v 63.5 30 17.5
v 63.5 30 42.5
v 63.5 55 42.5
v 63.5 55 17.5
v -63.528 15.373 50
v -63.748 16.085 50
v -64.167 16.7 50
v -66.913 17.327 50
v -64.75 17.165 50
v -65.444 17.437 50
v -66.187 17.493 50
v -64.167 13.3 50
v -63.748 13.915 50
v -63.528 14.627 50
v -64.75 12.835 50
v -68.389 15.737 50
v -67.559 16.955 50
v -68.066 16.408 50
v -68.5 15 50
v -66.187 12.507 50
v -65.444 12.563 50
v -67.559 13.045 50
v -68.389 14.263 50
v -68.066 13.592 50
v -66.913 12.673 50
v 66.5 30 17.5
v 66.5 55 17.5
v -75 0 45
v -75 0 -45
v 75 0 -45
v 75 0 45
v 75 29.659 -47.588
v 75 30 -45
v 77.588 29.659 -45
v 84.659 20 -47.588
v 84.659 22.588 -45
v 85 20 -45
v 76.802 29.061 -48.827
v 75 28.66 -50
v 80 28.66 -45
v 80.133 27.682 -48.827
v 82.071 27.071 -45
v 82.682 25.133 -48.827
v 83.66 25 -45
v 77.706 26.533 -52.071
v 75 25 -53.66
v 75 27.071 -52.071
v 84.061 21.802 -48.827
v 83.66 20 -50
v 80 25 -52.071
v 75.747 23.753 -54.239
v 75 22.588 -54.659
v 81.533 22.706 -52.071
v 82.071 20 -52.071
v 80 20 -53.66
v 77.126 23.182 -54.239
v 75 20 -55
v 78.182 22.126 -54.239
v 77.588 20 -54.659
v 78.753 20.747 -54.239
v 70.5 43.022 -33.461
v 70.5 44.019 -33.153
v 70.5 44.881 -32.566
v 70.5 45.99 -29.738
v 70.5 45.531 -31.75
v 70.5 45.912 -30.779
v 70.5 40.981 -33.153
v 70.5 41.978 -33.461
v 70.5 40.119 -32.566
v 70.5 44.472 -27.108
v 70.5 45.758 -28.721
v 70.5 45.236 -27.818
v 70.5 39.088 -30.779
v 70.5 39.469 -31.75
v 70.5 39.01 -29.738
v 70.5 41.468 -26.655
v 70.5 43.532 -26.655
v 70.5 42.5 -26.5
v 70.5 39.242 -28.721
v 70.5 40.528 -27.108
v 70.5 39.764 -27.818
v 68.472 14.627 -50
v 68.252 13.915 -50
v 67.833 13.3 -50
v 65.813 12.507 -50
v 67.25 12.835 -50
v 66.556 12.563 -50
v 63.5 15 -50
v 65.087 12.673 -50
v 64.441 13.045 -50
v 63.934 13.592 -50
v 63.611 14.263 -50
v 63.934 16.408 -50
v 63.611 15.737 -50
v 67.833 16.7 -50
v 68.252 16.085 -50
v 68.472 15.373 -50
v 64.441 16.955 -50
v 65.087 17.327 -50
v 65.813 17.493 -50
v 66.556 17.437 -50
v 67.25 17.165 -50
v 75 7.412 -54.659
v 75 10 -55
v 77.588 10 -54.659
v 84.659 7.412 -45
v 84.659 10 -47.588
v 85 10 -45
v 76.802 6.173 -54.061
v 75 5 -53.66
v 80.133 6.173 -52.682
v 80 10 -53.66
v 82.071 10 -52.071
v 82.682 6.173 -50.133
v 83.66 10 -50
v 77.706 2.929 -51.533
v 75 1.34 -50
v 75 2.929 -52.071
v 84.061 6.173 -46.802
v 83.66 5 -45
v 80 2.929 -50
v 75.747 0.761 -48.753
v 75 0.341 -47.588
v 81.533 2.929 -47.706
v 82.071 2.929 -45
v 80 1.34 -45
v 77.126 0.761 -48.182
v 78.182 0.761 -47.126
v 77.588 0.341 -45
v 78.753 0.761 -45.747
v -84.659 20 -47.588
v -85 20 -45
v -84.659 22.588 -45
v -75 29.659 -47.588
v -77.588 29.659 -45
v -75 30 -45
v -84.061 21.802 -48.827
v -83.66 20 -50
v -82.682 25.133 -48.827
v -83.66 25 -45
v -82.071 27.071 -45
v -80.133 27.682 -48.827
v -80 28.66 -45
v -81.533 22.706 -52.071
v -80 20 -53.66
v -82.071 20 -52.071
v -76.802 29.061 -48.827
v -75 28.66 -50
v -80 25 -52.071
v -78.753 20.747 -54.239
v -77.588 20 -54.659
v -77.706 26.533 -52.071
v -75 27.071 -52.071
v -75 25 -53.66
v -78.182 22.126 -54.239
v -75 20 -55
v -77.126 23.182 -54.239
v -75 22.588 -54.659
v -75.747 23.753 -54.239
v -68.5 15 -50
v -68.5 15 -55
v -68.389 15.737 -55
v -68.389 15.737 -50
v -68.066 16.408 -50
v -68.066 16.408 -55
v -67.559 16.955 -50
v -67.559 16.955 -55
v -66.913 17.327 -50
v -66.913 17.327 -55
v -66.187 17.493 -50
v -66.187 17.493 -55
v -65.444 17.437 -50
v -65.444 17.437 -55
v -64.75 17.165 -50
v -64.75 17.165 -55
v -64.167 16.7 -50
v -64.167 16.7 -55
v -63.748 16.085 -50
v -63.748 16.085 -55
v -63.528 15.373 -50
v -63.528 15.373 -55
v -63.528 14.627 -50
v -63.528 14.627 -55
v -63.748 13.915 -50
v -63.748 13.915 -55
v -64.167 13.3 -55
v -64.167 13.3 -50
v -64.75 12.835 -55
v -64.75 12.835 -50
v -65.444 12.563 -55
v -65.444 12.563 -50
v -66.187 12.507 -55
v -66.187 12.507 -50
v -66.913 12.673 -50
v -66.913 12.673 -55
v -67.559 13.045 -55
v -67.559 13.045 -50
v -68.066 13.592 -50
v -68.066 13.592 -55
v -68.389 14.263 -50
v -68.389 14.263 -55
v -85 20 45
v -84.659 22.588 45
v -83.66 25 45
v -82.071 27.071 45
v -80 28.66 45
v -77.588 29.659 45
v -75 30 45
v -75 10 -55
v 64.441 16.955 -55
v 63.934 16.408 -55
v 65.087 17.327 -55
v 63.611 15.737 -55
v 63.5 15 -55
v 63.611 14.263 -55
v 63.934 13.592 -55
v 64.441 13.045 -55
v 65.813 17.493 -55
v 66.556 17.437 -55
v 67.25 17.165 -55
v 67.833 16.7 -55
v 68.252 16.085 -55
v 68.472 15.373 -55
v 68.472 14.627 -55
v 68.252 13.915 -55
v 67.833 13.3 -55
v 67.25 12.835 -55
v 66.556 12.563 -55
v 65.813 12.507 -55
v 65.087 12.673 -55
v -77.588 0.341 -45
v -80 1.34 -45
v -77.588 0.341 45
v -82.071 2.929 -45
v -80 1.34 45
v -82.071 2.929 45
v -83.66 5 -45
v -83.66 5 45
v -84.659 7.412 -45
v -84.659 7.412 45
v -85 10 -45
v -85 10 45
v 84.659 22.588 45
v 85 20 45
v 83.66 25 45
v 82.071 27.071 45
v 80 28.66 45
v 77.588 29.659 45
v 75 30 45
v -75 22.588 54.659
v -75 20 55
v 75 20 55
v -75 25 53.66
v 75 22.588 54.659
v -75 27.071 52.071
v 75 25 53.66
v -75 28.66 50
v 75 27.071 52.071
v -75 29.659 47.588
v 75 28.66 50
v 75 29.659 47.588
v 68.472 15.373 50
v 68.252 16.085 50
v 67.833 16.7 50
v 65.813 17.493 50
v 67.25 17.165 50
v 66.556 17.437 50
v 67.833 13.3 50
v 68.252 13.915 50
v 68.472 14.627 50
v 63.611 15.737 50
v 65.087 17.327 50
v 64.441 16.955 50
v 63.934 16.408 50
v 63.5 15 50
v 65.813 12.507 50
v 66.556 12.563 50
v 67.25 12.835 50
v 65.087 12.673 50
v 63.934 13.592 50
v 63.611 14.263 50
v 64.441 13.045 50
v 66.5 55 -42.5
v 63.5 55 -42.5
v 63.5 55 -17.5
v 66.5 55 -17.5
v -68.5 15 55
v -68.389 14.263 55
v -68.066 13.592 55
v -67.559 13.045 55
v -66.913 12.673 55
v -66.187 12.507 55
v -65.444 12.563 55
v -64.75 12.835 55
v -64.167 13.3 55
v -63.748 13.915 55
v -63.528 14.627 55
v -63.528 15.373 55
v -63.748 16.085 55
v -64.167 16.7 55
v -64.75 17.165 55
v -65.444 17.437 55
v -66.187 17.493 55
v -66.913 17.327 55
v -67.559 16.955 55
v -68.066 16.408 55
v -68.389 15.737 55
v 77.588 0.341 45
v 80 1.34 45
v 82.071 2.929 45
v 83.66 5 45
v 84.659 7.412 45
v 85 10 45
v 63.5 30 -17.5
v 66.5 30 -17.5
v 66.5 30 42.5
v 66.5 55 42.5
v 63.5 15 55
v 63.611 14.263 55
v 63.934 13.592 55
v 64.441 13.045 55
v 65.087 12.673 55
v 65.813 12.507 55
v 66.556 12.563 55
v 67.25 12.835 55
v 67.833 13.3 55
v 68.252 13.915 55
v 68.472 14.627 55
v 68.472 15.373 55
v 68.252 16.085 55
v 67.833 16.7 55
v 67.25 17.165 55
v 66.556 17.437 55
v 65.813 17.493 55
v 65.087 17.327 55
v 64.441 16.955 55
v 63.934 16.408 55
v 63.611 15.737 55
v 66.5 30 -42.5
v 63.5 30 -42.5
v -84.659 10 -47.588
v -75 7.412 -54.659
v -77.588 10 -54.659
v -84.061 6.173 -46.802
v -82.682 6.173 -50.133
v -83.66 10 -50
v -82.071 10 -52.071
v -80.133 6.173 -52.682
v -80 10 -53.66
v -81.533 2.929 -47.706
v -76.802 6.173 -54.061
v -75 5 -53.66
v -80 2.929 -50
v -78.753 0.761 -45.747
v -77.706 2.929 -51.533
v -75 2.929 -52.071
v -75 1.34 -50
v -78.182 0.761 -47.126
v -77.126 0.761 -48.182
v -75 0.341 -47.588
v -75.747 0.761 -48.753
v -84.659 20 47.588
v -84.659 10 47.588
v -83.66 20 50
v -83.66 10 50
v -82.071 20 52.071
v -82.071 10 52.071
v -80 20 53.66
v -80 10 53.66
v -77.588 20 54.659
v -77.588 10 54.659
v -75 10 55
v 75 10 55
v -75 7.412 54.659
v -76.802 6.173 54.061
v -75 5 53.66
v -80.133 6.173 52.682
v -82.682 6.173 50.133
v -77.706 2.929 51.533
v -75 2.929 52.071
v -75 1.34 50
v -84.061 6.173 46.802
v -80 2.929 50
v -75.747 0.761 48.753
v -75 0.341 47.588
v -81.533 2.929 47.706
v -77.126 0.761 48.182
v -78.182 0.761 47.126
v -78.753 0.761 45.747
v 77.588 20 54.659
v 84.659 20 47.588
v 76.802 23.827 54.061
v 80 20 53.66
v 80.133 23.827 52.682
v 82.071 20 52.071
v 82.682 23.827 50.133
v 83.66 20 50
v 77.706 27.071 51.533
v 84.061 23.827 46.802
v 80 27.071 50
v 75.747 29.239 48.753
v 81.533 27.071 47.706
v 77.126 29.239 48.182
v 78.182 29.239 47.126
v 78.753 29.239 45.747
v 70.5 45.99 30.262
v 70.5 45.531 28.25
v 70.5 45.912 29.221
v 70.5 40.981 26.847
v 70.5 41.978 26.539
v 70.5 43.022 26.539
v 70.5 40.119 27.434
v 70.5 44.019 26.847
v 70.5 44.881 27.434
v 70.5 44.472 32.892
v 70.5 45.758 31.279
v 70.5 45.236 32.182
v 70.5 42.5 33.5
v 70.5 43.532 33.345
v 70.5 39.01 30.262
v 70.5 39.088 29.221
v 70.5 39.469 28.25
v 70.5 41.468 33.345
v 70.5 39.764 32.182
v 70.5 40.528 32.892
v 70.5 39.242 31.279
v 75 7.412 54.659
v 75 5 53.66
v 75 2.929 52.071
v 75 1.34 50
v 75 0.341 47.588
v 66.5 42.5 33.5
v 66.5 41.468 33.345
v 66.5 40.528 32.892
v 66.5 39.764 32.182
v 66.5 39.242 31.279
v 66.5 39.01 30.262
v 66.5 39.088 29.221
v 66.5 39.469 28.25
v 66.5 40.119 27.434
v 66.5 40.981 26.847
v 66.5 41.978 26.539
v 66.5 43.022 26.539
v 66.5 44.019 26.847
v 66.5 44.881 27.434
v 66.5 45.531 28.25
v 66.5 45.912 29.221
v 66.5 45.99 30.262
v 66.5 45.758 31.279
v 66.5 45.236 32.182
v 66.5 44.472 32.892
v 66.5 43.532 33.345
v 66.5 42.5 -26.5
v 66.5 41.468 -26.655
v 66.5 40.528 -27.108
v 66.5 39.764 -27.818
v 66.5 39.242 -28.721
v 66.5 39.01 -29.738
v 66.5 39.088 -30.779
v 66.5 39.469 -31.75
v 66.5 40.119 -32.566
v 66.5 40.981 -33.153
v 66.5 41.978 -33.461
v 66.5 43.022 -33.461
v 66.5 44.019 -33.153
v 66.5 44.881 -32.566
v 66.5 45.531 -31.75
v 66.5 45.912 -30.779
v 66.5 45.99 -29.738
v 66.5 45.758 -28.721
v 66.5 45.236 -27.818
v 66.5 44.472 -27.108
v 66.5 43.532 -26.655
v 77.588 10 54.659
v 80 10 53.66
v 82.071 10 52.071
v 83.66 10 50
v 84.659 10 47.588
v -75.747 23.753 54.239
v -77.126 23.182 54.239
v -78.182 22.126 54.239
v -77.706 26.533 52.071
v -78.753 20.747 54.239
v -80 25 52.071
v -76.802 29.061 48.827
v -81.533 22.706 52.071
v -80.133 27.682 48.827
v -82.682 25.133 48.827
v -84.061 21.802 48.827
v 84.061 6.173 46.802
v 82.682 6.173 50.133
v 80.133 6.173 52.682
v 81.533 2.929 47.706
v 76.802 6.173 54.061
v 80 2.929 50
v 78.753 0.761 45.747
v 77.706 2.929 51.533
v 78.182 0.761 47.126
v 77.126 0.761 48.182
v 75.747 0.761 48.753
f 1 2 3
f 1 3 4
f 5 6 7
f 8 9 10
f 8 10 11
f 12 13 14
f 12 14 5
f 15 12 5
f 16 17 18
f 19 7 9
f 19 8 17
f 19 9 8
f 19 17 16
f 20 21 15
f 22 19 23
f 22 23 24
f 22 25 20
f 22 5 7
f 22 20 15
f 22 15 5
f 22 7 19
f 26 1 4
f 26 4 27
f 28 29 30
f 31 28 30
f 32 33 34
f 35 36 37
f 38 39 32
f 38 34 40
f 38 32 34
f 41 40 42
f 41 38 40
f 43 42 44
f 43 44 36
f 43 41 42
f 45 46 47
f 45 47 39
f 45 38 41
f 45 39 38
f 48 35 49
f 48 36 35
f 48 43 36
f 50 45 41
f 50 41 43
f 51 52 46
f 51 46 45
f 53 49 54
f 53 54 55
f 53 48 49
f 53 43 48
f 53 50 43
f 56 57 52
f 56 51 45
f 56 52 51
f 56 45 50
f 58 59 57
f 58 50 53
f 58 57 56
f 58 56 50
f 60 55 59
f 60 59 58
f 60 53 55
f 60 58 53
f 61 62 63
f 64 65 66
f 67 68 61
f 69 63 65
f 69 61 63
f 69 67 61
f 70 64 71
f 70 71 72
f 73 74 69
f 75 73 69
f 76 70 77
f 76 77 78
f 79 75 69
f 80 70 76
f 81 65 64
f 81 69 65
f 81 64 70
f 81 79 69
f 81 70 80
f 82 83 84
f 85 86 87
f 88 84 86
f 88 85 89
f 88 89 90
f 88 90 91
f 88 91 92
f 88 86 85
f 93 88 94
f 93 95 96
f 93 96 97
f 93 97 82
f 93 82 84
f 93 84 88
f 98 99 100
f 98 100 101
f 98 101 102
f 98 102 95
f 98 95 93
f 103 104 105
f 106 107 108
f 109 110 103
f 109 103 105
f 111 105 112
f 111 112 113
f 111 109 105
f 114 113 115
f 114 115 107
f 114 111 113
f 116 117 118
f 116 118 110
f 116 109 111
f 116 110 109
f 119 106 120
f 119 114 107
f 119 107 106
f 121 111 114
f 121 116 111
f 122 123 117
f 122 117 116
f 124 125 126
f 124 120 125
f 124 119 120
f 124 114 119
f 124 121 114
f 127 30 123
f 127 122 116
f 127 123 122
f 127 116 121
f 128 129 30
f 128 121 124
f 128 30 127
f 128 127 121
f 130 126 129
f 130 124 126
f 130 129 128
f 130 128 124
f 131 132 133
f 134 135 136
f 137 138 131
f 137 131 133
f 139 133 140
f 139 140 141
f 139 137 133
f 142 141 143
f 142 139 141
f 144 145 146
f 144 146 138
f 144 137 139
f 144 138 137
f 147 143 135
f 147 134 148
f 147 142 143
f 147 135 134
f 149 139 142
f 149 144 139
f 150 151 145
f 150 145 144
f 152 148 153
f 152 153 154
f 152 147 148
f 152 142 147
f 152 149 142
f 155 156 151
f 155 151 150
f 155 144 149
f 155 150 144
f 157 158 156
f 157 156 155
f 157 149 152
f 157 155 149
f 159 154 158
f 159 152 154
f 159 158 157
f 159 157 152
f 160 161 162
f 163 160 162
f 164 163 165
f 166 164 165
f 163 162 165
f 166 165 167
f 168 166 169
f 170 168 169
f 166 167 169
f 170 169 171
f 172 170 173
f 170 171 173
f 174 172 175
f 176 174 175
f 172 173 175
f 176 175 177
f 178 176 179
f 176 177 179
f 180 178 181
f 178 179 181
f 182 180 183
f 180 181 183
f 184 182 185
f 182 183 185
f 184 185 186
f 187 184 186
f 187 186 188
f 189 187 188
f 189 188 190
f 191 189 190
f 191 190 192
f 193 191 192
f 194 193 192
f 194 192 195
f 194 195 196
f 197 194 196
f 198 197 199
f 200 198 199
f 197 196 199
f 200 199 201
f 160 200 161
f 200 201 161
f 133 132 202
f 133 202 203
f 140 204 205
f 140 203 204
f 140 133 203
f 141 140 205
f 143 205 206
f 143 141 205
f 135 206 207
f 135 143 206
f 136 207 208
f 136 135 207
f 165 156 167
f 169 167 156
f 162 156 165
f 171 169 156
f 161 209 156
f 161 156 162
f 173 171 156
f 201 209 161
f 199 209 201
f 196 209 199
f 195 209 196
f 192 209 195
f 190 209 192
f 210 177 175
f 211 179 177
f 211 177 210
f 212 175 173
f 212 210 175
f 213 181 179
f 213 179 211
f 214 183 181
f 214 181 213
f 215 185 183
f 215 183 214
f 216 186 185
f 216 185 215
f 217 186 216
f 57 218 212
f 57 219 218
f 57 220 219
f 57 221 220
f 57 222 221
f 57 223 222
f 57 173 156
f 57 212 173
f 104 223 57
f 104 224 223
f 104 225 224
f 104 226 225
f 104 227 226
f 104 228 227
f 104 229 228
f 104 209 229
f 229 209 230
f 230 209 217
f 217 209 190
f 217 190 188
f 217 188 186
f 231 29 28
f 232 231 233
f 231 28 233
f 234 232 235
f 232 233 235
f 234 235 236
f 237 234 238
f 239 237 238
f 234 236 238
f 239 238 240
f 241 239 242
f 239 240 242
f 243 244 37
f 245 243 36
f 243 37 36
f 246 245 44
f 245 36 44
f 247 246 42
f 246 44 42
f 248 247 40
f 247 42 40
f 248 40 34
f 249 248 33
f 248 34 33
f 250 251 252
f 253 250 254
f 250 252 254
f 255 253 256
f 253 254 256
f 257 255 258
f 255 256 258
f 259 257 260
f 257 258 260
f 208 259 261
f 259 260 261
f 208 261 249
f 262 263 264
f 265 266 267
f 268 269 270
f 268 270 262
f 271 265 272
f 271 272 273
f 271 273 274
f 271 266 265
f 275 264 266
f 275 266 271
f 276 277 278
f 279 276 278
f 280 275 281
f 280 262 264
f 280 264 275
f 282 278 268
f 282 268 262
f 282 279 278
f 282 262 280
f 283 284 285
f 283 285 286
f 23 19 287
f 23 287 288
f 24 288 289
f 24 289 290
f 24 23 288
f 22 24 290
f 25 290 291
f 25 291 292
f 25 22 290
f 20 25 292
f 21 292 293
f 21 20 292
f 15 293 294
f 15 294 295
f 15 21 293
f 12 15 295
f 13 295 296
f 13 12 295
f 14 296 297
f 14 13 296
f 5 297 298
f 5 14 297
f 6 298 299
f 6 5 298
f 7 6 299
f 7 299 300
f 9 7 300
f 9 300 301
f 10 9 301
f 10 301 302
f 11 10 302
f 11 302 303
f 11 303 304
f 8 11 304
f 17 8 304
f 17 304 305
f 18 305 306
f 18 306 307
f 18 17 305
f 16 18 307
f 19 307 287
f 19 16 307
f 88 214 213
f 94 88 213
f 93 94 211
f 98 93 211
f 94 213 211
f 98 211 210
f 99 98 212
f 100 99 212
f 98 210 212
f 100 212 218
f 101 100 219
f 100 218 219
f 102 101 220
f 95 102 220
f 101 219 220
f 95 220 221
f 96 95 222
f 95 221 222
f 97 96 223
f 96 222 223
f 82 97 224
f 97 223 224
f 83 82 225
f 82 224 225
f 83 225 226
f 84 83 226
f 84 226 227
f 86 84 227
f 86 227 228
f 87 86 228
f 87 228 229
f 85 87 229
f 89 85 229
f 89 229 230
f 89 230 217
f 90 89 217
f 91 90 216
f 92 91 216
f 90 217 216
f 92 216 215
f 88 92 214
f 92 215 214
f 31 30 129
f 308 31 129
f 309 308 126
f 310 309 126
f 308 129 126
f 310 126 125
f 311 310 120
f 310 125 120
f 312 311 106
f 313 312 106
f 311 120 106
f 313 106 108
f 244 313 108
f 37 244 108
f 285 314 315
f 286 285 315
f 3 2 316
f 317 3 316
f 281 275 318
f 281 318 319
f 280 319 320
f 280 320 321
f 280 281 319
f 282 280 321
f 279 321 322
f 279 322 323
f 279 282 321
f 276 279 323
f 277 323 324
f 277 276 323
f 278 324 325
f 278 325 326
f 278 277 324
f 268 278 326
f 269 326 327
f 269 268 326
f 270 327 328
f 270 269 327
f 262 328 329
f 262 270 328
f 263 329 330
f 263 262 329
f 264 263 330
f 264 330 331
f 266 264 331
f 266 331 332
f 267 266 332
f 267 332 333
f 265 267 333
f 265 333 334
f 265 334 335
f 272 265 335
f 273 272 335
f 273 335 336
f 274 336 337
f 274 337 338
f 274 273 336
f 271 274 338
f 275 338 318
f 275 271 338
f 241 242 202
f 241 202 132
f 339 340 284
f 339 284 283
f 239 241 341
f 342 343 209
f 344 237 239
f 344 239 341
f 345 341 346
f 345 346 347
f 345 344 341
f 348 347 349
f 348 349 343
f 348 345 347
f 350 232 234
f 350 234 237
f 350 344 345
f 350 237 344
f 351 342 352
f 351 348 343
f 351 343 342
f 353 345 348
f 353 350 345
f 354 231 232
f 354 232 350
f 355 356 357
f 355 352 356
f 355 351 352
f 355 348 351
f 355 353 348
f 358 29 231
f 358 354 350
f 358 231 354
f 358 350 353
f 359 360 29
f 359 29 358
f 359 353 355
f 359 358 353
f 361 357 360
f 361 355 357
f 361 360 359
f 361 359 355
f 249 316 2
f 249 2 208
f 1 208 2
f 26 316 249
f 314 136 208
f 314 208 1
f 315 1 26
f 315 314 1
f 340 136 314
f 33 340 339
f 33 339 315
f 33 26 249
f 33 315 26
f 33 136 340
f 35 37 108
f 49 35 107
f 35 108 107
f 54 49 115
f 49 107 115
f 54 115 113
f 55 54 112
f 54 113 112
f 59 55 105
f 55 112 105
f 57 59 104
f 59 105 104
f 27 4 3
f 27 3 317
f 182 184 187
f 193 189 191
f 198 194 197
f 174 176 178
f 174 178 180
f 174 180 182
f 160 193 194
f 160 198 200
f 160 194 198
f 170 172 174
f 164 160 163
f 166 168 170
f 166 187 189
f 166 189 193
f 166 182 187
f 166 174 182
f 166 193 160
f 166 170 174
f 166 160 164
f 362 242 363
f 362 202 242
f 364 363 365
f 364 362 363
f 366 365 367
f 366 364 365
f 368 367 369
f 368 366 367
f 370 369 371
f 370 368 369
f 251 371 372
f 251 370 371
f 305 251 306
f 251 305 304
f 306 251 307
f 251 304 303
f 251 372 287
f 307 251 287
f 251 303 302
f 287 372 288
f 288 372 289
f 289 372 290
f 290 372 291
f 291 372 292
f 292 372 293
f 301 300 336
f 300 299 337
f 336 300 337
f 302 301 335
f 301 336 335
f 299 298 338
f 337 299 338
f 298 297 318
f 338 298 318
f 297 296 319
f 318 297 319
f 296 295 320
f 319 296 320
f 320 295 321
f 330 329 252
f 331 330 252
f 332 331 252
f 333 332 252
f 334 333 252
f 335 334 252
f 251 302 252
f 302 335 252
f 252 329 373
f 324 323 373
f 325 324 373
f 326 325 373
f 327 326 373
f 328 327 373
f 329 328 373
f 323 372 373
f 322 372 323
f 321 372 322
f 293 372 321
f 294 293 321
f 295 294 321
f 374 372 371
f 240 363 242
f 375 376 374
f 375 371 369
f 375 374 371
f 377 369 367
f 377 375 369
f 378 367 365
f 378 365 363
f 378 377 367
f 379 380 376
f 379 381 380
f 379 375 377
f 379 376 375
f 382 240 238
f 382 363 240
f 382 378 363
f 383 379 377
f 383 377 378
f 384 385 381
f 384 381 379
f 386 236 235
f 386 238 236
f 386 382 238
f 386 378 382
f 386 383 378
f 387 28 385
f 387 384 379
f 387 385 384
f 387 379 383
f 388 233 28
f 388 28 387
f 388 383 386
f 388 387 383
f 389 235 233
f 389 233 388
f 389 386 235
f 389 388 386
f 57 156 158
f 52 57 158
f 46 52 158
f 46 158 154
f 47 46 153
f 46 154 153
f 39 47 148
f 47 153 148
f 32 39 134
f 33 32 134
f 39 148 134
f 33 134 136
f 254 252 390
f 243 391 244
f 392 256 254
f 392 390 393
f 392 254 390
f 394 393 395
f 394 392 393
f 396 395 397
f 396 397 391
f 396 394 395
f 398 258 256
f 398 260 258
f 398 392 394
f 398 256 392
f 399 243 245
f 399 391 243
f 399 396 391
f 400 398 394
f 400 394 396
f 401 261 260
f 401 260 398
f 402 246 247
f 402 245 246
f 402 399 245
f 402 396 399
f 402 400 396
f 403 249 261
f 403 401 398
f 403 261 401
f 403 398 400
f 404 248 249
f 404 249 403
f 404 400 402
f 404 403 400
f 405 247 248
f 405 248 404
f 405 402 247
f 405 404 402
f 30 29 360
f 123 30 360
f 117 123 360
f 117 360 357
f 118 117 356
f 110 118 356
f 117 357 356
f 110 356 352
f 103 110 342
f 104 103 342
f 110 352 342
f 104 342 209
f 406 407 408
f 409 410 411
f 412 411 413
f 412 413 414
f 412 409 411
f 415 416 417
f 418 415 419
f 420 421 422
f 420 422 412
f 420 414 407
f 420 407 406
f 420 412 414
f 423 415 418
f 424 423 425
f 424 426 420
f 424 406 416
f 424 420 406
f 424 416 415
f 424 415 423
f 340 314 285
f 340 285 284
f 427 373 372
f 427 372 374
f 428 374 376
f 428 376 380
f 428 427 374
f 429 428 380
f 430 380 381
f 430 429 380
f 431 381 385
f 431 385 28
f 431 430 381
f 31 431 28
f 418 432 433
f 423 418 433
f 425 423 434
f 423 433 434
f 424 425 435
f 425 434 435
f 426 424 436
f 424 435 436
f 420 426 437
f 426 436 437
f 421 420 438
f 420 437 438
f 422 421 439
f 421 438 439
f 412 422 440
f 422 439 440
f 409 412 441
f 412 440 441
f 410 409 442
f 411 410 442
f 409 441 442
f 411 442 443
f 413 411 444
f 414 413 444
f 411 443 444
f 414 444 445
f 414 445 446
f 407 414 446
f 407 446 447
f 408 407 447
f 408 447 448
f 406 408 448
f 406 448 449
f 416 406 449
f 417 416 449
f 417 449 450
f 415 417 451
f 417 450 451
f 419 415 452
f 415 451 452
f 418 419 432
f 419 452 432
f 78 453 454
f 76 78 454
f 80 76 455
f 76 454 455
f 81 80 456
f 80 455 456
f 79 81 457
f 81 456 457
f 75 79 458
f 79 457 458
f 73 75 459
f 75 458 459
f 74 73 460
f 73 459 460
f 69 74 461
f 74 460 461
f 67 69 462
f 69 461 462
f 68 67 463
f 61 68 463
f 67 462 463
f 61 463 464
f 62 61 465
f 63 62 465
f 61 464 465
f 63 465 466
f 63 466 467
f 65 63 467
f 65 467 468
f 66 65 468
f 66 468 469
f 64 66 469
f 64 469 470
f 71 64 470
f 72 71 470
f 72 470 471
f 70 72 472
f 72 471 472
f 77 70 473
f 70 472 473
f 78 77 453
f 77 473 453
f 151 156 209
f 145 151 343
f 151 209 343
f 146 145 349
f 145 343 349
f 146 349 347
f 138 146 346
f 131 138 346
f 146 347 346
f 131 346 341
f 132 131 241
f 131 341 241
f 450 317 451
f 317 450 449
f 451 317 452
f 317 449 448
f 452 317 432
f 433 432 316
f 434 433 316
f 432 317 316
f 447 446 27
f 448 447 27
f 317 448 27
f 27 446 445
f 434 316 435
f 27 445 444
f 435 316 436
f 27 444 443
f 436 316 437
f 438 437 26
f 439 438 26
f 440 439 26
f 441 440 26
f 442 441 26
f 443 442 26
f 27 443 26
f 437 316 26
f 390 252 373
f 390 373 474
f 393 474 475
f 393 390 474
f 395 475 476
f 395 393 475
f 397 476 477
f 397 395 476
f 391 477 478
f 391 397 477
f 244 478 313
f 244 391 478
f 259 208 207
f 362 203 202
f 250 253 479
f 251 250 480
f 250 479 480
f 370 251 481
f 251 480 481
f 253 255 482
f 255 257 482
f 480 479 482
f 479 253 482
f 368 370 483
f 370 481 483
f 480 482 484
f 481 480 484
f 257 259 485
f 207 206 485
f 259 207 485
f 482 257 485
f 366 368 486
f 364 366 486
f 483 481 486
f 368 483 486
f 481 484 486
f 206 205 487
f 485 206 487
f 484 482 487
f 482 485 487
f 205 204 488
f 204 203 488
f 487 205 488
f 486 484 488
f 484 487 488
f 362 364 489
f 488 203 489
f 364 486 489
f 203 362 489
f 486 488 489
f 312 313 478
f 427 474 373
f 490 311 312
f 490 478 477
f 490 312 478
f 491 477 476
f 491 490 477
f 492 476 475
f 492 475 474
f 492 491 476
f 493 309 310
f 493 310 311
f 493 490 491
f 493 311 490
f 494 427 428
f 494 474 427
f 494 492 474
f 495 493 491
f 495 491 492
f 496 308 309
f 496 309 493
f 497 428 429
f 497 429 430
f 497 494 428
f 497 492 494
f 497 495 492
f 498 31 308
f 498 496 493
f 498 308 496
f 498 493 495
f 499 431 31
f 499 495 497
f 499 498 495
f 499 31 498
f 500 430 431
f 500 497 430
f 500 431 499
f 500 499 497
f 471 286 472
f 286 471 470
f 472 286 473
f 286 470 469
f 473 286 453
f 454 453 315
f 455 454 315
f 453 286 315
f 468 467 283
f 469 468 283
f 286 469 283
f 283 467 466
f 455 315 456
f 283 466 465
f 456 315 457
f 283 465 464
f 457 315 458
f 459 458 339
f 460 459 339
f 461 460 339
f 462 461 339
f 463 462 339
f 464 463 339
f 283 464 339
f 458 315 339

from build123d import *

# Parameters (mm, degrees)
SKETCH1_W           = 170
SKETCH1_H           = 110
BOSS_EXTRUDE1_DEPTH = 30
FILLET2_R           = 10
FILLET3_R           = 10
FILLET4_R           = 10
SKETCH3_R           = 2.5
CUT_EXTRUDE1_DEPTH  = 5
CUT_EXTRUDE2_START  = -5
SKETCH5_R           = 2.5
CUT_EXTRUDE2_DEPTH  = 5
SKETCH6_W           = 3
SKETCH6_H           = 25
BOSS_EXTRUDE2_DEPTH = 25
SKETCH7_R           = 3.5
BOSS_EXTRUDE3_DEPTH = 4
SKETCH8_R           = 3.5
BOSS_EXTRUDE4_DEPTH = 4


with BuildPart() as part:
    # Sketch1 → Boss-Extrude1 (new body)
    with BuildSketch(Plane(origin=(0, 0, 0), x_dir=(1, 0, 0), z_dir=(0, 1, 0))):
        Rectangle(SKETCH1_W, SKETCH1_H)
    extrude(amount=BOSS_EXTRUDE1_DEPTH)

    # Fillet2
    fillet2_edges = [part.edges().sort_by_distance(p)[0] for p in [
        (-85, 30, 0),
        (0, 30, 55),
        (0, 0, 55),
        (85, 15, 55),
        (-85, 15, 55),
    ]]
    fillet(fillet2_edges, radius=FILLET2_R)

    # Fillet3
    # the kernel refuses this fillet: 10 mm, written as the material it takes off along each edge
    with BuildSketch(Plane(origin=(75, 20, 45), x_dir=(1, 0, 0), z_dir=(0, 1, 0))) as fillet3_piece_1_section:
        Polygon((0, 0), (FILLET3_R, 0), (FILLET3_R, -FILLET3_R), (0, -FILLET3_R), align=None)
    fillet3_piece_1 = extrude(amount=FILLET3_R, mode=Mode.PRIVATE)
    fillet3_piece_1 = fillet3_piece_1 - Plane(origin=(75, 20, 45), x_dir=(-0.7071067811865475, 0, -0.7071067811865475), z_dir=(0, 1, 0)) * Sphere(FILLET3_R, mode=Mode.PRIVATE)
    add(fillet3_piece_1, mode=Mode.SUBTRACT)
    with BuildSketch(Plane(origin=(75, 20, -45), x_dir=(0, 1, 0), z_dir=(0, 0, -1))) as fillet3_piece_2_section:
        Polygon((0, 0), (FILLET3_R, 0), (FILLET3_R, FILLET3_R), (0, FILLET3_R), align=None)
    fillet3_piece_2 = extrude(amount=FILLET3_R, mode=Mode.PRIVATE)
    fillet3_piece_2 = fillet3_piece_2 - Plane(origin=(75, 20, -45), x_dir=(-0.7071067811865475, -0.7071067811865475, 0), z_dir=(0, 0, -1)) * Sphere(FILLET3_R, mode=Mode.PRIVATE)
    add(fillet3_piece_2, mode=Mode.SUBTRACT)
    with BuildSketch(Plane(origin=(-85, -25, -55), x_dir=(1, 0, 0), z_dir=(0, 1, 0))) as fillet3_piece_3:
        with BuildLine():
            CenterArc((FILLET3_R, -FILLET3_R), FILLET3_R, 90, 90)
            Line((0, -FILLET3_R), (0, 0))
            Line((0, 0), (FILLET3_R, 0))
        make_face()
    extrude(amount=45, mode=Mode.SUBTRACT)
    with BuildSketch(Plane(origin=(85, 30, -45), x_dir=(-1, 0, 0), z_dir=(0, 0, 1))) as fillet3_piece_4:
        with BuildLine():
            CenterArc((FILLET3_R, FILLET3_R), FILLET3_R, 180, 90)
            Line((0, FILLET3_R), (0, 0))
            Line((0, 0), (FILLET3_R, 0))
        make_face()
    extrude(amount=90, mode=Mode.SUBTRACT)
    with BuildSketch(Plane(origin=(-75, 20, -55), x_dir=(-1, 0, 0), z_dir=(0, -1, 0))) as fillet3_piece_5:
        with BuildLine():
            CenterArc((10 - FILLET3_R, -FILLET3_R), FILLET3_R, 0, 90)
            Line((10, -FILLET3_R), (10, 0))
            Line((10, 0), (10 - FILLET3_R, 0))
        make_face()
    revolve(axis=Axis((-75, 20, -55), (0, 0, -1)), revolution_arc=90, mode=Mode.SUBTRACT)
    with BuildSketch(Plane(origin=(85, -25, -55), x_dir=(-1, 0, 0), z_dir=(0, 1, 0))) as fillet3_piece_6:
        with BuildLine():
            CenterArc((FILLET3_R, FILLET3_R), FILLET3_R, 180, 90)
            Line((0, FILLET3_R), (0, 0))
            Line((0, 0), (FILLET3_R, 0))
        make_face()
    extrude(amount=45, mode=Mode.SUBTRACT)
    with BuildSketch(Plane(origin=(-75, 30, -55), x_dir=(0, -1, 0), z_dir=(1, 0, 0))) as fillet3_piece_7:
        with BuildLine():
            CenterArc((FILLET3_R, -FILLET3_R), FILLET3_R, 90, 90)
            Line((0, -FILLET3_R), (0, 0))
            Line((0, 0), (FILLET3_R, 0))
        make_face()
    extrude(amount=150, mode=Mode.SUBTRACT)

    # Fillet4
    # the kernel refuses this fillet: 10 mm, written as the material it takes off along each edge
    with BuildSketch(Plane(origin=(75, 10, 45), x_dir=(1, 0, 0), z_dir=(0, -1, 0))) as fillet4_piece_1_section:
        Polygon((0, 0), (FILLET4_R, 0), (FILLET4_R, FILLET4_R), (0, FILLET4_R), align=None)
    fillet4_piece_1 = extrude(amount=FILLET4_R, mode=Mode.PRIVATE)
    fillet4_piece_1 = fillet4_piece_1 - Plane(origin=(75, 10, 45), x_dir=(-0.7071067811865475, 0, -0.7071067811865475), z_dir=(0, -1, 0)) * Sphere(FILLET4_R, mode=Mode.PRIVATE)
    add(fillet4_piece_1, mode=Mode.SUBTRACT)
    with BuildSketch(Plane(origin=(-75, 10, 45), x_dir=(-1, 0, 0), z_dir=(0, -1, 0))) as fillet4_piece_2_section:
        Polygon((0, 0), (FILLET4_R, 0), (FILLET4_R, -FILLET4_R), (0, -FILLET4_R), align=None)
    fillet4_piece_2 = extrude(amount=FILLET4_R, mode=Mode.PRIVATE)
    fillet4_piece_2 = fillet4_piece_2 - Plane(origin=(-75, 10, 45), x_dir=(0.7071067811865475, 0, -0.7071067811865475), z_dir=(0, -1, 0)) * Sphere(FILLET4_R, mode=Mode.PRIVATE)
    add(fillet4_piece_2, mode=Mode.SUBTRACT)
    with BuildSketch(Plane(origin=(85, 0, -45), x_dir=(-1, 0, 0), z_dir=(0, 0, 1)), Plane(origin=(-85, 0, 45), x_dir=(1, 0, 0), z_dir=(0, 0, -1))) as fillet4_piece_3:
        with BuildLine():
            CenterArc((FILLET4_R, -FILLET4_R), FILLET4_R, 90, 90)
            Line((0, -FILLET4_R), (0, 0))
            Line((0, 0), (FILLET4_R, 0))
        make_face()
    extrude(amount=90, mode=Mode.SUBTRACT)
    with BuildSketch(Plane(origin=(-75, 0, -55), x_dir=(0, 1, 0), z_dir=(1, 0, 0))) as fillet4_piece_4:
        with BuildLine():
            CenterArc((FILLET4_R, FILLET4_R), FILLET4_R, 180, 90)
            Line((0, FILLET4_R), (0, 0))
            Line((0, 0), (FILLET4_R, 0))
        make_face()
    extrude(amount=150, mode=Mode.SUBTRACT)
    with BuildSketch(Plane(origin=(75, 0, -45), x_dir=(0, 0, -1), z_dir=(-1, 0, 0))) as fillet4_piece_5:
        with BuildLine():
            CenterArc((10 - FILLET4_R, -FILLET4_R), FILLET4_R, 0, 90)
            Line((10, -FILLET4_R), (10, 0))
            Line((10, 0), (10 - FILLET4_R, 0))
        make_face()
    revolve(axis=Axis((75, 0, -45), (0, -1, 0)), revolution_arc=90, mode=Mode.SUBTRACT)
    with BuildSketch(Plane(origin=(-75, 0, -45), x_dir=(-1, 0, 0), z_dir=(0, 0, 1))) as fillet4_piece_6:
        with BuildLine():
            CenterArc((10 - FILLET4_R, -FILLET4_R), FILLET4_R, 0, 90)
            Line((10, -FILLET4_R), (10, 0))
            Line((10, 0), (10 - FILLET4_R, 0))
        make_face()
    revolve(axis=Axis((-75, 0, -45), (0, -1, 0)), revolution_arc=90, mode=Mode.SUBTRACT)

    # Sketch3 → Cut-Extrude1 (cut)
    with BuildSketch(Plane(origin=(0, 0, -55), x_dir=(-1, 0, 0), z_dir=(0, 0, -1))):
        with Locations((-66, 15)):
            Circle(SKETCH3_R)
        with Locations((66, 15)):
            Circle(SKETCH3_R)
    extrude(amount=-CUT_EXTRUDE1_DEPTH, mode=Mode.SUBTRACT)

    # Sketch5 → Cut-Extrude2 (cut)
    with BuildSketch(Plane.XY.offset(55).offset(CUT_EXTRUDE2_START)):
        with Locations(Location((-66, 15, 0), (0, 0, 180))):
            Circle(SKETCH5_R)
        with Locations(Location((66, 15, 0), (0, 0, 180))):
            Circle(SKETCH5_R)
    extrude(amount=CUT_EXTRUDE2_DEPTH, mode=Mode.SUBTRACT)

    # Sketch6 → Boss-Extrude2 (add)
    with BuildSketch(Plane(origin=(0, 30, 0), x_dir=(1, 0, 0), z_dir=(0, 1, 0))):
        with Locations((65, 30)):
            Rectangle(SKETCH6_W, SKETCH6_H)
        with Locations((65, -30)):
            Rectangle(SKETCH6_W, SKETCH6_H)
    extrude(amount=BOSS_EXTRUDE2_DEPTH)

    # Sketch7 → Boss-Extrude3 (add)
    with BuildSketch(Plane(origin=(66.5, 0, 0), x_dir=(0, 0, -1), z_dir=(1, 0, 0))):
        with Locations(Location((-30, 42.5, 0), (0, 0, 180))):
            Circle(SKETCH7_R)
    extrude(amount=BOSS_EXTRUDE3_DEPTH)

    # Sketch8 → Boss-Extrude4 (add)
    with BuildSketch(Plane(origin=(66.5, 0, 0), x_dir=(0, 0, -1), z_dir=(1, 0, 0))):
        with Locations(Location((30, 42.5, 0), (0, 0, 180))):
            Circle(SKETCH8_R)
    extrude(amount=BOSS_EXTRUDE4_DEPTH)


solid = part.part
